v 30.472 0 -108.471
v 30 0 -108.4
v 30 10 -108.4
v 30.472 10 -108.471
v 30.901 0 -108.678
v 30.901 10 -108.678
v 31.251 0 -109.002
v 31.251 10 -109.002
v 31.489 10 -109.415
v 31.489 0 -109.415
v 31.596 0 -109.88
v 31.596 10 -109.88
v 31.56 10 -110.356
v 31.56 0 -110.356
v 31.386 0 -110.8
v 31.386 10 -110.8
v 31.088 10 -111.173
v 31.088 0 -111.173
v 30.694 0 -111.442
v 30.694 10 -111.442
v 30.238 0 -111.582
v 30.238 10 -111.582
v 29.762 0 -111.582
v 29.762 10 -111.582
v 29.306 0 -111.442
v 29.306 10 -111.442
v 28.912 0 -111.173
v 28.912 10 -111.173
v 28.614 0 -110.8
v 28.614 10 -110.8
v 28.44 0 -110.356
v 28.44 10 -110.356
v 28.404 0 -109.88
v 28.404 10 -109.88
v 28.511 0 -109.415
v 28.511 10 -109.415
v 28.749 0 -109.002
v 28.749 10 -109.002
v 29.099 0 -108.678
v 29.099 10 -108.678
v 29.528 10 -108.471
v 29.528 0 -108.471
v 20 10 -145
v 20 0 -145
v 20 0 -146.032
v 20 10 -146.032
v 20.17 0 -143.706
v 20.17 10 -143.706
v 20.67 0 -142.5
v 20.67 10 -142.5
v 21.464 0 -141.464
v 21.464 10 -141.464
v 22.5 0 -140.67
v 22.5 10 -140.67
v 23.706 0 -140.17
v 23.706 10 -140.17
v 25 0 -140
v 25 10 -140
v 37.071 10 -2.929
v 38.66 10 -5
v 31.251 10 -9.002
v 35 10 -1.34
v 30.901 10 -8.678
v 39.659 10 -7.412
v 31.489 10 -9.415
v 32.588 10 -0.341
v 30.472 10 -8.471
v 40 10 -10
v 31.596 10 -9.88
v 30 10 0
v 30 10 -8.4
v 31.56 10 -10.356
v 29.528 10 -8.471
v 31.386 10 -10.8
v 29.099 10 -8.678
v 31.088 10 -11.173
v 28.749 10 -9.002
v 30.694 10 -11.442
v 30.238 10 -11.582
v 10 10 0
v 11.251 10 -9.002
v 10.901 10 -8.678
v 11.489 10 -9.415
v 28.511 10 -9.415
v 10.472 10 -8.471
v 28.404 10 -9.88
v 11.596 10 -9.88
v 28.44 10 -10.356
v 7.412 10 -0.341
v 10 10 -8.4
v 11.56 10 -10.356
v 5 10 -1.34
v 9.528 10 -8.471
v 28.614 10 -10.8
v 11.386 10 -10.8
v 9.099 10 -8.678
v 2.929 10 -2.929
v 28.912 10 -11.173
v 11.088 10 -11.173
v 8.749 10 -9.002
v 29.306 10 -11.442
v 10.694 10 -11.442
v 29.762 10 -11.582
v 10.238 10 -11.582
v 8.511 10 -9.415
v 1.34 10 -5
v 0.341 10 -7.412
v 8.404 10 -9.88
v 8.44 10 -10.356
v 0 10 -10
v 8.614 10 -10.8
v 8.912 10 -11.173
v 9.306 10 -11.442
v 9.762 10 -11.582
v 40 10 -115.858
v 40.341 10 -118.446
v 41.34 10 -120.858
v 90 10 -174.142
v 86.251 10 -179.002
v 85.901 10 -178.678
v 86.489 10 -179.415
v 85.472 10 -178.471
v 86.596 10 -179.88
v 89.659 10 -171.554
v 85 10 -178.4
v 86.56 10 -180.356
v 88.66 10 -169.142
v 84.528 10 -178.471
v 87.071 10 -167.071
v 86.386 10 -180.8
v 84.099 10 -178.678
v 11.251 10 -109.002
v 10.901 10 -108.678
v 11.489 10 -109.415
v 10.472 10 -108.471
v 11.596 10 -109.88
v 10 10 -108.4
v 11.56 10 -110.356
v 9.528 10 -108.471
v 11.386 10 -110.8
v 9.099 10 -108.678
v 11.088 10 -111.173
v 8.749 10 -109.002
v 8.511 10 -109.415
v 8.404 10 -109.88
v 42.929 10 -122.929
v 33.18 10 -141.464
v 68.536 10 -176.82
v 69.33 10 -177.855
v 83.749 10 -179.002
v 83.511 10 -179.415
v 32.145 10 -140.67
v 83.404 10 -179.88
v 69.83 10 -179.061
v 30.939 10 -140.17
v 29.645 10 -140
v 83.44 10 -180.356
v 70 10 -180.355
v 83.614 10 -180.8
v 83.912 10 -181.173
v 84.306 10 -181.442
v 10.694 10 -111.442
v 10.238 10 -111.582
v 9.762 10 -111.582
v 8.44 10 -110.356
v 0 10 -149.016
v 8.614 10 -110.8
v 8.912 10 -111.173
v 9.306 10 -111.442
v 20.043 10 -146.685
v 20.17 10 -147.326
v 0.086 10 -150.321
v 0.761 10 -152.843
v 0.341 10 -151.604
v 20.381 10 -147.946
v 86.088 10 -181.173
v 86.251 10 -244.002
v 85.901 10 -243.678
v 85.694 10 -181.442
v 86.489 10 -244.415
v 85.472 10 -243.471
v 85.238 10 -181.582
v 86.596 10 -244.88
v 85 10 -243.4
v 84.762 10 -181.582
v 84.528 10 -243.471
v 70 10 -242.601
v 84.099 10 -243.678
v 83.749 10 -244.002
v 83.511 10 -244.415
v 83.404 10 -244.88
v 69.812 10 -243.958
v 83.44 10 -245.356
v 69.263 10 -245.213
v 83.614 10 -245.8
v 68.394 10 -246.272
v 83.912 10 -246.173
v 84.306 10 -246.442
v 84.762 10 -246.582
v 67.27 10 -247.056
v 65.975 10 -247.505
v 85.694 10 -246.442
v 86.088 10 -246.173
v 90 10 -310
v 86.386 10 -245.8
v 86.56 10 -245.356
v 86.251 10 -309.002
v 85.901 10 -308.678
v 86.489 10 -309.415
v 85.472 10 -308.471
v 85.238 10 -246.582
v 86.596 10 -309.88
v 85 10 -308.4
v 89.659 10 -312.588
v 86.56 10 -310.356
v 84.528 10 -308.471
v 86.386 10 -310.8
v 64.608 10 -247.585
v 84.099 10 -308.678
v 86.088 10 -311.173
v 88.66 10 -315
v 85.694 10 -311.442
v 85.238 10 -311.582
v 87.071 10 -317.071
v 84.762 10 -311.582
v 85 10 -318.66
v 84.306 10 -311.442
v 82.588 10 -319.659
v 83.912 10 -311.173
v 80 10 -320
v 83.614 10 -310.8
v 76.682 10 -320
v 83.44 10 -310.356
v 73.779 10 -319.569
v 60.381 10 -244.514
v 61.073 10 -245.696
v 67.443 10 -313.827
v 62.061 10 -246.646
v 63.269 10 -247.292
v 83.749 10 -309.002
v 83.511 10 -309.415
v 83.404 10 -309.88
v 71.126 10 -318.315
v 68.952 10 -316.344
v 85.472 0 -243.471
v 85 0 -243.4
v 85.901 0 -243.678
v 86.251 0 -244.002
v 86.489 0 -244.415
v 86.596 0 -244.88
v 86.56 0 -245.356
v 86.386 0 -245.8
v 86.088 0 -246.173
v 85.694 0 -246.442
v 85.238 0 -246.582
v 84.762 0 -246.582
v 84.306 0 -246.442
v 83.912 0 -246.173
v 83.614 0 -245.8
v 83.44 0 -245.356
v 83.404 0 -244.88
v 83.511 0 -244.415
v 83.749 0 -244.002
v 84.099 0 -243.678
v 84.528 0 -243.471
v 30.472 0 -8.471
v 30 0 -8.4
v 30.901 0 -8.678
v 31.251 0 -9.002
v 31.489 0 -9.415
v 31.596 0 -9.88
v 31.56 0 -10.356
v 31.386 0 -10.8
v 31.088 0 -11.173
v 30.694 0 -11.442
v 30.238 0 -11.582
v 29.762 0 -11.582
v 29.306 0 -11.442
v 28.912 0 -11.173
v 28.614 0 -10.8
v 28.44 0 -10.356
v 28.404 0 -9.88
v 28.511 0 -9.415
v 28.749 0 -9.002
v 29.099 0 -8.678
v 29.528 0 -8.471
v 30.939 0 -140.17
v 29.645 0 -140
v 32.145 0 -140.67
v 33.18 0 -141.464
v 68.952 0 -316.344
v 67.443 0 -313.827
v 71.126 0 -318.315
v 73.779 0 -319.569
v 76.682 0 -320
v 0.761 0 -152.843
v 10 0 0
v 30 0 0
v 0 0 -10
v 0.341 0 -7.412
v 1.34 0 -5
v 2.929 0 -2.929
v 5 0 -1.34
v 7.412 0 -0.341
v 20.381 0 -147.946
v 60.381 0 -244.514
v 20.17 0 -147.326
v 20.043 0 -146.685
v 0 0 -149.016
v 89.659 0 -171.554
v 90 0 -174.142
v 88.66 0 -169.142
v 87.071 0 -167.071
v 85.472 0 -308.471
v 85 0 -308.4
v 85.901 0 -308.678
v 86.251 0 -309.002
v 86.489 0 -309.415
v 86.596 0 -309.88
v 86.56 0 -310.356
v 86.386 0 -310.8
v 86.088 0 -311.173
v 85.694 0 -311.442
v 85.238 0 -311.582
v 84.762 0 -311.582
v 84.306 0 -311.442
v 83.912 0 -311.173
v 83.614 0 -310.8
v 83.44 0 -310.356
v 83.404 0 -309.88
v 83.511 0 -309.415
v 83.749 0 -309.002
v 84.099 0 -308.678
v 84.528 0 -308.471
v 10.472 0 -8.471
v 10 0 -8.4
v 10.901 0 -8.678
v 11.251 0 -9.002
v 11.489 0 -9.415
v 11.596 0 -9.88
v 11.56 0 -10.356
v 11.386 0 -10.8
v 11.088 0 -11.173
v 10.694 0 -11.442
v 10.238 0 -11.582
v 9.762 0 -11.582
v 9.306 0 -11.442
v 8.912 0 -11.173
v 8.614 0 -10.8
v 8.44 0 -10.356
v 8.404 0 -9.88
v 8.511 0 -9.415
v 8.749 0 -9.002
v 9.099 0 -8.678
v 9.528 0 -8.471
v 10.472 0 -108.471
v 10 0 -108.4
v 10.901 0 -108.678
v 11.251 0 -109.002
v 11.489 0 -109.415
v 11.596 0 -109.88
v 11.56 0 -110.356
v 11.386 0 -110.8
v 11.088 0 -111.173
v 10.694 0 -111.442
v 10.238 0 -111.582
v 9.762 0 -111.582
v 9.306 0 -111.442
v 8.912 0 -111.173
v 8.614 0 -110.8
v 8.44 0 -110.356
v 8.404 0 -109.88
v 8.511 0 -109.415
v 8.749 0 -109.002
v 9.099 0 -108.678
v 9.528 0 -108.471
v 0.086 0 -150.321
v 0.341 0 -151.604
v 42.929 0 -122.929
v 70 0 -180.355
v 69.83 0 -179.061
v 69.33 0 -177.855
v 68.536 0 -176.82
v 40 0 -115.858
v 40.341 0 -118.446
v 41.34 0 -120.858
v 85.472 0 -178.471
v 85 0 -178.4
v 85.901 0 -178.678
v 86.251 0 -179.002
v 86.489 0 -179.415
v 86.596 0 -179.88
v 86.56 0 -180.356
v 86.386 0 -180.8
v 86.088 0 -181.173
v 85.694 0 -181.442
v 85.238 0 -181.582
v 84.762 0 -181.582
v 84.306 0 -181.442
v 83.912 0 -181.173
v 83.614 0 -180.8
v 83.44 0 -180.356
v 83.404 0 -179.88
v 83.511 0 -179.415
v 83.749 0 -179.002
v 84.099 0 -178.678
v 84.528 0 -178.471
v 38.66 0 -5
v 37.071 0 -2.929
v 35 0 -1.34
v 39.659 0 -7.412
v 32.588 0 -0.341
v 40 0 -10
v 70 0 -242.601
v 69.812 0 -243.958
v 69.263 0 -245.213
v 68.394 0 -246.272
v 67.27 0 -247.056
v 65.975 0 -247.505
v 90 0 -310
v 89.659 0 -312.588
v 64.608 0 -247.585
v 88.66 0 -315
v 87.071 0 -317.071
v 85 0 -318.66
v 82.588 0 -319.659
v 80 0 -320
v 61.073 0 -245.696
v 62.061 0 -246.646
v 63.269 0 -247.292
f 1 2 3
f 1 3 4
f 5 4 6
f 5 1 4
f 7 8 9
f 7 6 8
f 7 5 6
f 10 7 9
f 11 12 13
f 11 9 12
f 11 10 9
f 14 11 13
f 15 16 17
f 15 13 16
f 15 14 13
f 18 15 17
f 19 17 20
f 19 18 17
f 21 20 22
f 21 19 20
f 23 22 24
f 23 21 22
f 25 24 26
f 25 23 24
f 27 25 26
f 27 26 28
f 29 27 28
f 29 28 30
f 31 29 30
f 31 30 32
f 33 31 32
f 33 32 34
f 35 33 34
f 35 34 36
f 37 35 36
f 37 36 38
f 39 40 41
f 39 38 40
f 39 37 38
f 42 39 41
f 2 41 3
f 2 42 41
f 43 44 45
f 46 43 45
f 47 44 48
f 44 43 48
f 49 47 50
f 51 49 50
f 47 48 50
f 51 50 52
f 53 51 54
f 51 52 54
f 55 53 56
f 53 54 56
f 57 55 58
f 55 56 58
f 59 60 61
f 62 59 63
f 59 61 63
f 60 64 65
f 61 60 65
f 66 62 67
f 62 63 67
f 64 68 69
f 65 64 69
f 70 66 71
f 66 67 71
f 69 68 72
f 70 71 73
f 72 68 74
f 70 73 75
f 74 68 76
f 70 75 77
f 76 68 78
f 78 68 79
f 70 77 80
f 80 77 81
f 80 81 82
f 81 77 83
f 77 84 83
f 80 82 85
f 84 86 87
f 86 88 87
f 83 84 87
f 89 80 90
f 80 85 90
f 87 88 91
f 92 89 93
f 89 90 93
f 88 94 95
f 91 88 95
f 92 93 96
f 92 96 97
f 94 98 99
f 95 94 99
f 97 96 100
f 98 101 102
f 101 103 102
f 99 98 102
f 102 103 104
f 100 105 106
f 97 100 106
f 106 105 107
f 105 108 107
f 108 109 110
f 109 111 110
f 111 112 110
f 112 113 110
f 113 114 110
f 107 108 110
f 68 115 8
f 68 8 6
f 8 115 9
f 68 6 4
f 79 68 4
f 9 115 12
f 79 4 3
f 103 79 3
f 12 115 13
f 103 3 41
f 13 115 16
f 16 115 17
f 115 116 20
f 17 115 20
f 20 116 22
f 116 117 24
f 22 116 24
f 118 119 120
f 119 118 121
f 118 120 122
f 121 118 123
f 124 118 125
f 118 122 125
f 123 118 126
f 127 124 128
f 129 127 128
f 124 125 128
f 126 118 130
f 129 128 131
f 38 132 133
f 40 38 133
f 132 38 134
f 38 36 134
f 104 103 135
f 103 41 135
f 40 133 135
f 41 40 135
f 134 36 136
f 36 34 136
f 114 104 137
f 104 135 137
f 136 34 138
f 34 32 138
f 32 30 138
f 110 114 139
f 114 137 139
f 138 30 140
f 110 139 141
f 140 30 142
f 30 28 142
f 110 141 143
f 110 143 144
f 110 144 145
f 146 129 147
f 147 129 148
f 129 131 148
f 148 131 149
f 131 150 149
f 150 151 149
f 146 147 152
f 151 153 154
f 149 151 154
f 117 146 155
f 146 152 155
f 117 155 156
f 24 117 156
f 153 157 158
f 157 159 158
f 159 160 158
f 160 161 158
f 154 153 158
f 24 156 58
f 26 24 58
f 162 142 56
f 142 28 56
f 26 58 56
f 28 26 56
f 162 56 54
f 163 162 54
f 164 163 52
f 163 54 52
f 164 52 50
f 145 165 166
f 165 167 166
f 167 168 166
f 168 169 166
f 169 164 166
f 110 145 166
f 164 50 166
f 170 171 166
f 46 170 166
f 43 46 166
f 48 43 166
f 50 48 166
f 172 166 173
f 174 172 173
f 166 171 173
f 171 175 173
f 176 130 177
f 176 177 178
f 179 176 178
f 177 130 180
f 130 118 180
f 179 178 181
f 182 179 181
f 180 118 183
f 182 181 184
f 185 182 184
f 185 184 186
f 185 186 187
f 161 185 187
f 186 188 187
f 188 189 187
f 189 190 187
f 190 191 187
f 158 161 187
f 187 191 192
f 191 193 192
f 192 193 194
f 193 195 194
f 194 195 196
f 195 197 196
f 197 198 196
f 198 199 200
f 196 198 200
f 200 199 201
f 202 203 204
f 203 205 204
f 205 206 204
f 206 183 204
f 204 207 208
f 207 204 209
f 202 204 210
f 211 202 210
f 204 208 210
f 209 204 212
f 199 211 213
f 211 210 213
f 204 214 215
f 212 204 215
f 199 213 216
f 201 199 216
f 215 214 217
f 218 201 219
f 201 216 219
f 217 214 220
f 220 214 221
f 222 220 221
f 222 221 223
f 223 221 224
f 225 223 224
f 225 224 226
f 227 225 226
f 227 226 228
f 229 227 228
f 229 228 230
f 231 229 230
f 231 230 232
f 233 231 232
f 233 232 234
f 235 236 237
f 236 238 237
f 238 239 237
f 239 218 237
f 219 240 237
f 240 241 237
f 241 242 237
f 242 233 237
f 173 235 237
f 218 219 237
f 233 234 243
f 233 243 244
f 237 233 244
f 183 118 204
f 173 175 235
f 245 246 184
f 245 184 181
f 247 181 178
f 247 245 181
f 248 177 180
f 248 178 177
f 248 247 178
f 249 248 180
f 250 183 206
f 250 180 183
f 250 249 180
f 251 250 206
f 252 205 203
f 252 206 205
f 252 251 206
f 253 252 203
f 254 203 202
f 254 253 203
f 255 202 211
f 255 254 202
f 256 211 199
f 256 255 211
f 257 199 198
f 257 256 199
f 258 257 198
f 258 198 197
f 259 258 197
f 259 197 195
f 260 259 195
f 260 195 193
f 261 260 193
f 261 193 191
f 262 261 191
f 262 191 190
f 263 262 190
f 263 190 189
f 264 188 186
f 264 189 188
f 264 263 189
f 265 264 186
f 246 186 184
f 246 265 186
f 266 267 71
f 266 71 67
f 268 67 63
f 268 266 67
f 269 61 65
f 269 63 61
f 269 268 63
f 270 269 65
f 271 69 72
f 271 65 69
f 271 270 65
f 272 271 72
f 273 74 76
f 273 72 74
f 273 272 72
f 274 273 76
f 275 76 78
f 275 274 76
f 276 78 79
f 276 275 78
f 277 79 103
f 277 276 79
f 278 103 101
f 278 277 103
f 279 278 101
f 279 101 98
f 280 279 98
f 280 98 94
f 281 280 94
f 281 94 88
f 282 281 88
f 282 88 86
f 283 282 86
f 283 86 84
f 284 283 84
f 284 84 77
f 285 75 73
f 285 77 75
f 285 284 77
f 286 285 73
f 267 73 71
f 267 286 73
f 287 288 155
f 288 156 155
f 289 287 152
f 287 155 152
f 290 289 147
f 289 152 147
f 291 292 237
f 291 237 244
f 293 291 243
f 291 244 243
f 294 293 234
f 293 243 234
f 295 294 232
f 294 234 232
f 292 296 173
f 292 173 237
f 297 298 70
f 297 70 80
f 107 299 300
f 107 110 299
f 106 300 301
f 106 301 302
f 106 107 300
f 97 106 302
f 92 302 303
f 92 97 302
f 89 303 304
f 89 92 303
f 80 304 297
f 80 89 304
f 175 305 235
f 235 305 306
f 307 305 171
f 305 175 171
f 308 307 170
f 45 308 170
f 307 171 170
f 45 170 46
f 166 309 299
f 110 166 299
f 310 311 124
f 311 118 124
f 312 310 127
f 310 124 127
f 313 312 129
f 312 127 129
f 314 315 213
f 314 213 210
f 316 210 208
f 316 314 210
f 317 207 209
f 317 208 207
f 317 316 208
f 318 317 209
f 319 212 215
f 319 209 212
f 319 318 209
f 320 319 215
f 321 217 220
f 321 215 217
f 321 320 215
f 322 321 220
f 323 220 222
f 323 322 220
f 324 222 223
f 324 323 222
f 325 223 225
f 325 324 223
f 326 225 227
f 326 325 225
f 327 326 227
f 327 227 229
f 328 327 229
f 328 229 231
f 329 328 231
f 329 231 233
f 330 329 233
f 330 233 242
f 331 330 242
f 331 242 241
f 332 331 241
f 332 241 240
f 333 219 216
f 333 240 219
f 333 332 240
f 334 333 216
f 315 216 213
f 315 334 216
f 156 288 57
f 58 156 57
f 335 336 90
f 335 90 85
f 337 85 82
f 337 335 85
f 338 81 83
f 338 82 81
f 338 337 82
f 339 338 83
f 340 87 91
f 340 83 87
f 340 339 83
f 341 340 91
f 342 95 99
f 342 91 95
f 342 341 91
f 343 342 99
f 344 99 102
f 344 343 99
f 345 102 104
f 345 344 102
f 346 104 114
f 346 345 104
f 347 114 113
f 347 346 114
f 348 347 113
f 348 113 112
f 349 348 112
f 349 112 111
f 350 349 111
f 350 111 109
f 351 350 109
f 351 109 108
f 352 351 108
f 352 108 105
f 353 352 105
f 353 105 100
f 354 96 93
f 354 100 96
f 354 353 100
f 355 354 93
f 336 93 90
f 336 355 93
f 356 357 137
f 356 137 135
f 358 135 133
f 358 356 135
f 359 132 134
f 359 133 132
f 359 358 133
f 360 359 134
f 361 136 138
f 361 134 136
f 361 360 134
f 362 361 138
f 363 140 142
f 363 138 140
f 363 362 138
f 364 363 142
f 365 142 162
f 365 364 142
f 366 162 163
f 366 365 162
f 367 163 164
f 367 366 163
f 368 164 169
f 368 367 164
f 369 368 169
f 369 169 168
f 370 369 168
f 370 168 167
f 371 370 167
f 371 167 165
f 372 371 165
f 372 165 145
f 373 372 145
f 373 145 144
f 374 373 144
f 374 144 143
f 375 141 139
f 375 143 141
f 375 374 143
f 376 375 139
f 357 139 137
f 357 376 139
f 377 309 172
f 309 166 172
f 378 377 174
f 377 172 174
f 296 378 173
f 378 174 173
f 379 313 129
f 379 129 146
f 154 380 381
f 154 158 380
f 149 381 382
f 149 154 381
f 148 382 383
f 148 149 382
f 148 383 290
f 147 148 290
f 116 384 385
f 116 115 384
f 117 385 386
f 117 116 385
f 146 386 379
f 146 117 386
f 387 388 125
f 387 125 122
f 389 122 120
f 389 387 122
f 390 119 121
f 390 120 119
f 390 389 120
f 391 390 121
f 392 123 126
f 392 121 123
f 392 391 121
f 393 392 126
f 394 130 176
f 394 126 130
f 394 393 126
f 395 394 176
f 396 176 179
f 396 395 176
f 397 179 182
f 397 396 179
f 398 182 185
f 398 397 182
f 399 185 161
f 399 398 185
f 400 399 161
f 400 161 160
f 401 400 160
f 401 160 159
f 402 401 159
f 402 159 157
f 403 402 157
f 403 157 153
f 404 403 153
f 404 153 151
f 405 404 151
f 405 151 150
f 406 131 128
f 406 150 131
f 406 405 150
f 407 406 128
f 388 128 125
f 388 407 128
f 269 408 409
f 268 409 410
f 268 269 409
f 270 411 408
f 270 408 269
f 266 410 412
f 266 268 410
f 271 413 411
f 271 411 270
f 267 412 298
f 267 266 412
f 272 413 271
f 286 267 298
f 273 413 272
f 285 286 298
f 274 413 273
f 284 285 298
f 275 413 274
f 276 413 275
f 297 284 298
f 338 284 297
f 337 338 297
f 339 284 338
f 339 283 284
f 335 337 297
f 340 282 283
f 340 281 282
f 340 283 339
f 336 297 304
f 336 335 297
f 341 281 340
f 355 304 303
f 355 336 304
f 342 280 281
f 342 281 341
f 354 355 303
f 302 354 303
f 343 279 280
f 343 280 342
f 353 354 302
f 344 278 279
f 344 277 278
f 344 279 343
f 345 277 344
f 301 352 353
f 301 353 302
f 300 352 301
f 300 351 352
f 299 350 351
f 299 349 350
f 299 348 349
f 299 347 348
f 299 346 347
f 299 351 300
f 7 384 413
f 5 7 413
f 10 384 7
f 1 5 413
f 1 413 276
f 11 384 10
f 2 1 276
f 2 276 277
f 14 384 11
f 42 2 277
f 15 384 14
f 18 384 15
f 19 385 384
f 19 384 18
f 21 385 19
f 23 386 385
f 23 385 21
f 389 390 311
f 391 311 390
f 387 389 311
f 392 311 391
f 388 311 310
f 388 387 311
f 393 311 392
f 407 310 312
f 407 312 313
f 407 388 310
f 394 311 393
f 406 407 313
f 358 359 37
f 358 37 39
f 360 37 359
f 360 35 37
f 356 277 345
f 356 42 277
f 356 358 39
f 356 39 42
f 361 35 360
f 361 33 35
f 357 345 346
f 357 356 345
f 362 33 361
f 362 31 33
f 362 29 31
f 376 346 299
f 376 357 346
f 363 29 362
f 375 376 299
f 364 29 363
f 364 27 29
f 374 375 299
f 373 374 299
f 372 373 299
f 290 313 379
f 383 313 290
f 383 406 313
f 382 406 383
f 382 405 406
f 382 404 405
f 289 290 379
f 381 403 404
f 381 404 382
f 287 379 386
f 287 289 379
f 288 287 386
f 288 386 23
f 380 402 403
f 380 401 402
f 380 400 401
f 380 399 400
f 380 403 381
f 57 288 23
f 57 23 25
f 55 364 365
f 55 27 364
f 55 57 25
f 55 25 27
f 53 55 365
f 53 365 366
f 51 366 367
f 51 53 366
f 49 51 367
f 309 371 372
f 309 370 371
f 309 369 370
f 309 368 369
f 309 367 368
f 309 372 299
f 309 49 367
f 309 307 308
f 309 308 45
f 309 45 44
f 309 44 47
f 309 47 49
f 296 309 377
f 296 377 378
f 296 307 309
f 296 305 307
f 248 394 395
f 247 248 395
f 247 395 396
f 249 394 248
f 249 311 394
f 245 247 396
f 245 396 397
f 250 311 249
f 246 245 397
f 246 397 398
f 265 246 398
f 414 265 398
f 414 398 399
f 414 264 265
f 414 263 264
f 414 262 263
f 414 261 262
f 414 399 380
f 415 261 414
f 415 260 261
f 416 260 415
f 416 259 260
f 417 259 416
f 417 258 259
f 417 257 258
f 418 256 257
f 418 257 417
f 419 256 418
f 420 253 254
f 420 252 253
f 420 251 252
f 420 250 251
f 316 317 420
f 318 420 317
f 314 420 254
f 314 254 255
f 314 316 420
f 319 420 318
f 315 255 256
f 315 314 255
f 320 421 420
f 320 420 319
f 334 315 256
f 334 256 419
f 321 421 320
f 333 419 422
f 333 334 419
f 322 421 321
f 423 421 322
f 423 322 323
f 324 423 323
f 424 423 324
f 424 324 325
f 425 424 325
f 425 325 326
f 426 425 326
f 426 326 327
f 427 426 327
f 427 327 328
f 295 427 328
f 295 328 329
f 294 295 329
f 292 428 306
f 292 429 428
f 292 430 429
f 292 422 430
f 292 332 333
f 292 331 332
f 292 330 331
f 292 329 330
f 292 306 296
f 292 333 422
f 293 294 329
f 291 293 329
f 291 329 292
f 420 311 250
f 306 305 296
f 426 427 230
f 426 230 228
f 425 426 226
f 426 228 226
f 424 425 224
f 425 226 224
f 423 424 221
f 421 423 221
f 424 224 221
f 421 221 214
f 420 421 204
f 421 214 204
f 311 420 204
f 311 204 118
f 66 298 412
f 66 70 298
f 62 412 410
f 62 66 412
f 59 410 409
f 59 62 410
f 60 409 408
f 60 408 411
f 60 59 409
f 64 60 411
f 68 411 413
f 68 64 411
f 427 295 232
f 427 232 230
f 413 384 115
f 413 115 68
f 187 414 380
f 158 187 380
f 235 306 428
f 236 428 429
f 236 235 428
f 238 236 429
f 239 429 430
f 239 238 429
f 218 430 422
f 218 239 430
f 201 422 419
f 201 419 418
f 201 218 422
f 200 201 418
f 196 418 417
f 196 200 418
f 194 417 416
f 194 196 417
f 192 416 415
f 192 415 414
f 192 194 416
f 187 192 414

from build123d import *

# Parameters (mm, degrees)
BOSS_EXTRUDE1_DEPTH     = 10
CUT_EXTRUDE1_DEPTH      = 333.565782966
CUT_EXTRUDE1_DEPTH_BACK = 333.565782966
SKETCH2_R               = 1.6
FILLET2_R               = 5
CUT_EXTRUDE3_DEPTH      = 333.565782966
CUT_EXTRUDE3_DEPTH_BACK = 333.565782966
SKETCH4_R               = 1.6
FILLET3_R               = 10


with BuildPart() as part:
    # Sketch1 → Boss-Extrude1 (new body)
    with BuildSketch(Plane(origin=(0, 0, 0), x_dir=(1, 0, 0), z_dir=(0, 1, 0))):
        Polygon((0, 120), (0, 151.005050634), (70, 320), (90, 320), (90, 170), (40, 120), (40, 0), (0, 0), align=None)
        Polygon((20, 147.026803286), (70, 267.737481405), (70, 178.284271247), (31.715728753, 140), (20, 140), align=None, mode=Mode.SUBTRACT)
    extrude(amount=BOSS_EXTRUDE1_DEPTH)

    # Sketch2 → Cut-Extrude1 (cut, two sides: drawn at the far end of the back side and taken through both)
    with BuildSketch(Plane(origin=(0, 10, 0), x_dir=(1, 0, 0), z_dir=(0, 1, 0)).offset(-CUT_EXTRUDE1_DEPTH_BACK)):
        with Locations(Location((10, 110, 0), (0, 0, 270))):
            Circle(SKETCH2_R)
        with Locations(Location((30, 110, 0), (0, 0, 270))):
            Circle(SKETCH2_R)
        with Locations(Location((10, 10, 0), (0, 0, 270))):
            Circle(SKETCH2_R)
        with Locations(Location((30, 10, 0), (0, 0, 270))):
            Circle(SKETCH2_R)
    extrude(amount=CUT_EXTRUDE1_DEPTH + CUT_EXTRUDE1_DEPTH_BACK, mode=Mode.SUBTRACT)

    # Fillet2
    fillet2_edges = [part.edges().sort_by_distance(p)[0] for p in [
        (20, 5, -147.026803286),
        (20, 5, -140),
        (31.715728753, 5, -140),
        (70, 5, -178.284271247),
        (70, 5, -267.737481405),
    ]]
    fillet(fillet2_edges, radius=FILLET2_R)

    # Sketch4 → Cut-Extrude3 (cut, two sides: drawn at the far end of the back side and taken through both)
    with BuildSketch(Plane(origin=(0, 10, 0), x_dir=(1, 0, 0), z_dir=(0, 1, 0)).offset(-CUT_EXTRUDE3_DEPTH_BACK)):
        with Locations(Location((85, 310, 0), (0, 0, 270))):
            Circle(SKETCH4_R)
        with Locations(Location((85, 245, 0), (0, 0, 270))):
            Circle(SKETCH4_R)
        with Locations(Location((85, 180, 0), (0, 0, 270))):
            Circle(SKETCH4_R)
    extrude(amount=CUT_EXTRUDE3_DEPTH + CUT_EXTRUDE3_DEPTH_BACK, mode=Mode.SUBTRACT)

    # Fillet3
    fillet3_edges = [part.edges().sort_by_distance(p)[0] for p in [
        (0, 5, -151.005050634),
        (70, 5, -320),
        (90, 5, -320),
        (90, 5, -170),
        (40, 5, -120),
        (40, 5, 0),
        (0, 5, 0),
    ]]
    fillet(fillet3_edges, radius=FILLET3_R)


solid = part.part
